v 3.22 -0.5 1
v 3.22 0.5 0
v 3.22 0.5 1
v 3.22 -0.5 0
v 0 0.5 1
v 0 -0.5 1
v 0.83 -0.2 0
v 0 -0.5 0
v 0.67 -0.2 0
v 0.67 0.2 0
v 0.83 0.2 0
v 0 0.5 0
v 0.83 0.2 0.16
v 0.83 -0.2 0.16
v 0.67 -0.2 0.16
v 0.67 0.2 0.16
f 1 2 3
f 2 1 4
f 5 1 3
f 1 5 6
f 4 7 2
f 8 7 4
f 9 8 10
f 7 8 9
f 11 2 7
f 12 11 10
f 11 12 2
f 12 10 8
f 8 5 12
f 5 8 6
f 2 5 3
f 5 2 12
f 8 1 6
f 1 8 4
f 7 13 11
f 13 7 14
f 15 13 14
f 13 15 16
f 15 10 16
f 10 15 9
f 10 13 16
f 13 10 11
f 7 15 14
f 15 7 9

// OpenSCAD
res = 30;

xmax = 3.22;
ymax = 1.0;
zmax = 1.0;

bxmin = 0.67;
bxmax = 0.83;

bymin = -0.2;
bymax = 0.2;

bzmin = 0;
bzmax = 0.16;

bl = (bxmin+bxmax)/2.0;
bw = (bymin+bymax)/2.0;
bh = (bzmin+bzmax)/2.0;

difference () {
    translate([0, -ymax/2.0, 0]) cube([xmax, ymax, zmax]);
    translate([bxmin, bymin, 0]) cube([bxmax-bxmin, bymax-bymin, bzmax-bzmin]);
}
